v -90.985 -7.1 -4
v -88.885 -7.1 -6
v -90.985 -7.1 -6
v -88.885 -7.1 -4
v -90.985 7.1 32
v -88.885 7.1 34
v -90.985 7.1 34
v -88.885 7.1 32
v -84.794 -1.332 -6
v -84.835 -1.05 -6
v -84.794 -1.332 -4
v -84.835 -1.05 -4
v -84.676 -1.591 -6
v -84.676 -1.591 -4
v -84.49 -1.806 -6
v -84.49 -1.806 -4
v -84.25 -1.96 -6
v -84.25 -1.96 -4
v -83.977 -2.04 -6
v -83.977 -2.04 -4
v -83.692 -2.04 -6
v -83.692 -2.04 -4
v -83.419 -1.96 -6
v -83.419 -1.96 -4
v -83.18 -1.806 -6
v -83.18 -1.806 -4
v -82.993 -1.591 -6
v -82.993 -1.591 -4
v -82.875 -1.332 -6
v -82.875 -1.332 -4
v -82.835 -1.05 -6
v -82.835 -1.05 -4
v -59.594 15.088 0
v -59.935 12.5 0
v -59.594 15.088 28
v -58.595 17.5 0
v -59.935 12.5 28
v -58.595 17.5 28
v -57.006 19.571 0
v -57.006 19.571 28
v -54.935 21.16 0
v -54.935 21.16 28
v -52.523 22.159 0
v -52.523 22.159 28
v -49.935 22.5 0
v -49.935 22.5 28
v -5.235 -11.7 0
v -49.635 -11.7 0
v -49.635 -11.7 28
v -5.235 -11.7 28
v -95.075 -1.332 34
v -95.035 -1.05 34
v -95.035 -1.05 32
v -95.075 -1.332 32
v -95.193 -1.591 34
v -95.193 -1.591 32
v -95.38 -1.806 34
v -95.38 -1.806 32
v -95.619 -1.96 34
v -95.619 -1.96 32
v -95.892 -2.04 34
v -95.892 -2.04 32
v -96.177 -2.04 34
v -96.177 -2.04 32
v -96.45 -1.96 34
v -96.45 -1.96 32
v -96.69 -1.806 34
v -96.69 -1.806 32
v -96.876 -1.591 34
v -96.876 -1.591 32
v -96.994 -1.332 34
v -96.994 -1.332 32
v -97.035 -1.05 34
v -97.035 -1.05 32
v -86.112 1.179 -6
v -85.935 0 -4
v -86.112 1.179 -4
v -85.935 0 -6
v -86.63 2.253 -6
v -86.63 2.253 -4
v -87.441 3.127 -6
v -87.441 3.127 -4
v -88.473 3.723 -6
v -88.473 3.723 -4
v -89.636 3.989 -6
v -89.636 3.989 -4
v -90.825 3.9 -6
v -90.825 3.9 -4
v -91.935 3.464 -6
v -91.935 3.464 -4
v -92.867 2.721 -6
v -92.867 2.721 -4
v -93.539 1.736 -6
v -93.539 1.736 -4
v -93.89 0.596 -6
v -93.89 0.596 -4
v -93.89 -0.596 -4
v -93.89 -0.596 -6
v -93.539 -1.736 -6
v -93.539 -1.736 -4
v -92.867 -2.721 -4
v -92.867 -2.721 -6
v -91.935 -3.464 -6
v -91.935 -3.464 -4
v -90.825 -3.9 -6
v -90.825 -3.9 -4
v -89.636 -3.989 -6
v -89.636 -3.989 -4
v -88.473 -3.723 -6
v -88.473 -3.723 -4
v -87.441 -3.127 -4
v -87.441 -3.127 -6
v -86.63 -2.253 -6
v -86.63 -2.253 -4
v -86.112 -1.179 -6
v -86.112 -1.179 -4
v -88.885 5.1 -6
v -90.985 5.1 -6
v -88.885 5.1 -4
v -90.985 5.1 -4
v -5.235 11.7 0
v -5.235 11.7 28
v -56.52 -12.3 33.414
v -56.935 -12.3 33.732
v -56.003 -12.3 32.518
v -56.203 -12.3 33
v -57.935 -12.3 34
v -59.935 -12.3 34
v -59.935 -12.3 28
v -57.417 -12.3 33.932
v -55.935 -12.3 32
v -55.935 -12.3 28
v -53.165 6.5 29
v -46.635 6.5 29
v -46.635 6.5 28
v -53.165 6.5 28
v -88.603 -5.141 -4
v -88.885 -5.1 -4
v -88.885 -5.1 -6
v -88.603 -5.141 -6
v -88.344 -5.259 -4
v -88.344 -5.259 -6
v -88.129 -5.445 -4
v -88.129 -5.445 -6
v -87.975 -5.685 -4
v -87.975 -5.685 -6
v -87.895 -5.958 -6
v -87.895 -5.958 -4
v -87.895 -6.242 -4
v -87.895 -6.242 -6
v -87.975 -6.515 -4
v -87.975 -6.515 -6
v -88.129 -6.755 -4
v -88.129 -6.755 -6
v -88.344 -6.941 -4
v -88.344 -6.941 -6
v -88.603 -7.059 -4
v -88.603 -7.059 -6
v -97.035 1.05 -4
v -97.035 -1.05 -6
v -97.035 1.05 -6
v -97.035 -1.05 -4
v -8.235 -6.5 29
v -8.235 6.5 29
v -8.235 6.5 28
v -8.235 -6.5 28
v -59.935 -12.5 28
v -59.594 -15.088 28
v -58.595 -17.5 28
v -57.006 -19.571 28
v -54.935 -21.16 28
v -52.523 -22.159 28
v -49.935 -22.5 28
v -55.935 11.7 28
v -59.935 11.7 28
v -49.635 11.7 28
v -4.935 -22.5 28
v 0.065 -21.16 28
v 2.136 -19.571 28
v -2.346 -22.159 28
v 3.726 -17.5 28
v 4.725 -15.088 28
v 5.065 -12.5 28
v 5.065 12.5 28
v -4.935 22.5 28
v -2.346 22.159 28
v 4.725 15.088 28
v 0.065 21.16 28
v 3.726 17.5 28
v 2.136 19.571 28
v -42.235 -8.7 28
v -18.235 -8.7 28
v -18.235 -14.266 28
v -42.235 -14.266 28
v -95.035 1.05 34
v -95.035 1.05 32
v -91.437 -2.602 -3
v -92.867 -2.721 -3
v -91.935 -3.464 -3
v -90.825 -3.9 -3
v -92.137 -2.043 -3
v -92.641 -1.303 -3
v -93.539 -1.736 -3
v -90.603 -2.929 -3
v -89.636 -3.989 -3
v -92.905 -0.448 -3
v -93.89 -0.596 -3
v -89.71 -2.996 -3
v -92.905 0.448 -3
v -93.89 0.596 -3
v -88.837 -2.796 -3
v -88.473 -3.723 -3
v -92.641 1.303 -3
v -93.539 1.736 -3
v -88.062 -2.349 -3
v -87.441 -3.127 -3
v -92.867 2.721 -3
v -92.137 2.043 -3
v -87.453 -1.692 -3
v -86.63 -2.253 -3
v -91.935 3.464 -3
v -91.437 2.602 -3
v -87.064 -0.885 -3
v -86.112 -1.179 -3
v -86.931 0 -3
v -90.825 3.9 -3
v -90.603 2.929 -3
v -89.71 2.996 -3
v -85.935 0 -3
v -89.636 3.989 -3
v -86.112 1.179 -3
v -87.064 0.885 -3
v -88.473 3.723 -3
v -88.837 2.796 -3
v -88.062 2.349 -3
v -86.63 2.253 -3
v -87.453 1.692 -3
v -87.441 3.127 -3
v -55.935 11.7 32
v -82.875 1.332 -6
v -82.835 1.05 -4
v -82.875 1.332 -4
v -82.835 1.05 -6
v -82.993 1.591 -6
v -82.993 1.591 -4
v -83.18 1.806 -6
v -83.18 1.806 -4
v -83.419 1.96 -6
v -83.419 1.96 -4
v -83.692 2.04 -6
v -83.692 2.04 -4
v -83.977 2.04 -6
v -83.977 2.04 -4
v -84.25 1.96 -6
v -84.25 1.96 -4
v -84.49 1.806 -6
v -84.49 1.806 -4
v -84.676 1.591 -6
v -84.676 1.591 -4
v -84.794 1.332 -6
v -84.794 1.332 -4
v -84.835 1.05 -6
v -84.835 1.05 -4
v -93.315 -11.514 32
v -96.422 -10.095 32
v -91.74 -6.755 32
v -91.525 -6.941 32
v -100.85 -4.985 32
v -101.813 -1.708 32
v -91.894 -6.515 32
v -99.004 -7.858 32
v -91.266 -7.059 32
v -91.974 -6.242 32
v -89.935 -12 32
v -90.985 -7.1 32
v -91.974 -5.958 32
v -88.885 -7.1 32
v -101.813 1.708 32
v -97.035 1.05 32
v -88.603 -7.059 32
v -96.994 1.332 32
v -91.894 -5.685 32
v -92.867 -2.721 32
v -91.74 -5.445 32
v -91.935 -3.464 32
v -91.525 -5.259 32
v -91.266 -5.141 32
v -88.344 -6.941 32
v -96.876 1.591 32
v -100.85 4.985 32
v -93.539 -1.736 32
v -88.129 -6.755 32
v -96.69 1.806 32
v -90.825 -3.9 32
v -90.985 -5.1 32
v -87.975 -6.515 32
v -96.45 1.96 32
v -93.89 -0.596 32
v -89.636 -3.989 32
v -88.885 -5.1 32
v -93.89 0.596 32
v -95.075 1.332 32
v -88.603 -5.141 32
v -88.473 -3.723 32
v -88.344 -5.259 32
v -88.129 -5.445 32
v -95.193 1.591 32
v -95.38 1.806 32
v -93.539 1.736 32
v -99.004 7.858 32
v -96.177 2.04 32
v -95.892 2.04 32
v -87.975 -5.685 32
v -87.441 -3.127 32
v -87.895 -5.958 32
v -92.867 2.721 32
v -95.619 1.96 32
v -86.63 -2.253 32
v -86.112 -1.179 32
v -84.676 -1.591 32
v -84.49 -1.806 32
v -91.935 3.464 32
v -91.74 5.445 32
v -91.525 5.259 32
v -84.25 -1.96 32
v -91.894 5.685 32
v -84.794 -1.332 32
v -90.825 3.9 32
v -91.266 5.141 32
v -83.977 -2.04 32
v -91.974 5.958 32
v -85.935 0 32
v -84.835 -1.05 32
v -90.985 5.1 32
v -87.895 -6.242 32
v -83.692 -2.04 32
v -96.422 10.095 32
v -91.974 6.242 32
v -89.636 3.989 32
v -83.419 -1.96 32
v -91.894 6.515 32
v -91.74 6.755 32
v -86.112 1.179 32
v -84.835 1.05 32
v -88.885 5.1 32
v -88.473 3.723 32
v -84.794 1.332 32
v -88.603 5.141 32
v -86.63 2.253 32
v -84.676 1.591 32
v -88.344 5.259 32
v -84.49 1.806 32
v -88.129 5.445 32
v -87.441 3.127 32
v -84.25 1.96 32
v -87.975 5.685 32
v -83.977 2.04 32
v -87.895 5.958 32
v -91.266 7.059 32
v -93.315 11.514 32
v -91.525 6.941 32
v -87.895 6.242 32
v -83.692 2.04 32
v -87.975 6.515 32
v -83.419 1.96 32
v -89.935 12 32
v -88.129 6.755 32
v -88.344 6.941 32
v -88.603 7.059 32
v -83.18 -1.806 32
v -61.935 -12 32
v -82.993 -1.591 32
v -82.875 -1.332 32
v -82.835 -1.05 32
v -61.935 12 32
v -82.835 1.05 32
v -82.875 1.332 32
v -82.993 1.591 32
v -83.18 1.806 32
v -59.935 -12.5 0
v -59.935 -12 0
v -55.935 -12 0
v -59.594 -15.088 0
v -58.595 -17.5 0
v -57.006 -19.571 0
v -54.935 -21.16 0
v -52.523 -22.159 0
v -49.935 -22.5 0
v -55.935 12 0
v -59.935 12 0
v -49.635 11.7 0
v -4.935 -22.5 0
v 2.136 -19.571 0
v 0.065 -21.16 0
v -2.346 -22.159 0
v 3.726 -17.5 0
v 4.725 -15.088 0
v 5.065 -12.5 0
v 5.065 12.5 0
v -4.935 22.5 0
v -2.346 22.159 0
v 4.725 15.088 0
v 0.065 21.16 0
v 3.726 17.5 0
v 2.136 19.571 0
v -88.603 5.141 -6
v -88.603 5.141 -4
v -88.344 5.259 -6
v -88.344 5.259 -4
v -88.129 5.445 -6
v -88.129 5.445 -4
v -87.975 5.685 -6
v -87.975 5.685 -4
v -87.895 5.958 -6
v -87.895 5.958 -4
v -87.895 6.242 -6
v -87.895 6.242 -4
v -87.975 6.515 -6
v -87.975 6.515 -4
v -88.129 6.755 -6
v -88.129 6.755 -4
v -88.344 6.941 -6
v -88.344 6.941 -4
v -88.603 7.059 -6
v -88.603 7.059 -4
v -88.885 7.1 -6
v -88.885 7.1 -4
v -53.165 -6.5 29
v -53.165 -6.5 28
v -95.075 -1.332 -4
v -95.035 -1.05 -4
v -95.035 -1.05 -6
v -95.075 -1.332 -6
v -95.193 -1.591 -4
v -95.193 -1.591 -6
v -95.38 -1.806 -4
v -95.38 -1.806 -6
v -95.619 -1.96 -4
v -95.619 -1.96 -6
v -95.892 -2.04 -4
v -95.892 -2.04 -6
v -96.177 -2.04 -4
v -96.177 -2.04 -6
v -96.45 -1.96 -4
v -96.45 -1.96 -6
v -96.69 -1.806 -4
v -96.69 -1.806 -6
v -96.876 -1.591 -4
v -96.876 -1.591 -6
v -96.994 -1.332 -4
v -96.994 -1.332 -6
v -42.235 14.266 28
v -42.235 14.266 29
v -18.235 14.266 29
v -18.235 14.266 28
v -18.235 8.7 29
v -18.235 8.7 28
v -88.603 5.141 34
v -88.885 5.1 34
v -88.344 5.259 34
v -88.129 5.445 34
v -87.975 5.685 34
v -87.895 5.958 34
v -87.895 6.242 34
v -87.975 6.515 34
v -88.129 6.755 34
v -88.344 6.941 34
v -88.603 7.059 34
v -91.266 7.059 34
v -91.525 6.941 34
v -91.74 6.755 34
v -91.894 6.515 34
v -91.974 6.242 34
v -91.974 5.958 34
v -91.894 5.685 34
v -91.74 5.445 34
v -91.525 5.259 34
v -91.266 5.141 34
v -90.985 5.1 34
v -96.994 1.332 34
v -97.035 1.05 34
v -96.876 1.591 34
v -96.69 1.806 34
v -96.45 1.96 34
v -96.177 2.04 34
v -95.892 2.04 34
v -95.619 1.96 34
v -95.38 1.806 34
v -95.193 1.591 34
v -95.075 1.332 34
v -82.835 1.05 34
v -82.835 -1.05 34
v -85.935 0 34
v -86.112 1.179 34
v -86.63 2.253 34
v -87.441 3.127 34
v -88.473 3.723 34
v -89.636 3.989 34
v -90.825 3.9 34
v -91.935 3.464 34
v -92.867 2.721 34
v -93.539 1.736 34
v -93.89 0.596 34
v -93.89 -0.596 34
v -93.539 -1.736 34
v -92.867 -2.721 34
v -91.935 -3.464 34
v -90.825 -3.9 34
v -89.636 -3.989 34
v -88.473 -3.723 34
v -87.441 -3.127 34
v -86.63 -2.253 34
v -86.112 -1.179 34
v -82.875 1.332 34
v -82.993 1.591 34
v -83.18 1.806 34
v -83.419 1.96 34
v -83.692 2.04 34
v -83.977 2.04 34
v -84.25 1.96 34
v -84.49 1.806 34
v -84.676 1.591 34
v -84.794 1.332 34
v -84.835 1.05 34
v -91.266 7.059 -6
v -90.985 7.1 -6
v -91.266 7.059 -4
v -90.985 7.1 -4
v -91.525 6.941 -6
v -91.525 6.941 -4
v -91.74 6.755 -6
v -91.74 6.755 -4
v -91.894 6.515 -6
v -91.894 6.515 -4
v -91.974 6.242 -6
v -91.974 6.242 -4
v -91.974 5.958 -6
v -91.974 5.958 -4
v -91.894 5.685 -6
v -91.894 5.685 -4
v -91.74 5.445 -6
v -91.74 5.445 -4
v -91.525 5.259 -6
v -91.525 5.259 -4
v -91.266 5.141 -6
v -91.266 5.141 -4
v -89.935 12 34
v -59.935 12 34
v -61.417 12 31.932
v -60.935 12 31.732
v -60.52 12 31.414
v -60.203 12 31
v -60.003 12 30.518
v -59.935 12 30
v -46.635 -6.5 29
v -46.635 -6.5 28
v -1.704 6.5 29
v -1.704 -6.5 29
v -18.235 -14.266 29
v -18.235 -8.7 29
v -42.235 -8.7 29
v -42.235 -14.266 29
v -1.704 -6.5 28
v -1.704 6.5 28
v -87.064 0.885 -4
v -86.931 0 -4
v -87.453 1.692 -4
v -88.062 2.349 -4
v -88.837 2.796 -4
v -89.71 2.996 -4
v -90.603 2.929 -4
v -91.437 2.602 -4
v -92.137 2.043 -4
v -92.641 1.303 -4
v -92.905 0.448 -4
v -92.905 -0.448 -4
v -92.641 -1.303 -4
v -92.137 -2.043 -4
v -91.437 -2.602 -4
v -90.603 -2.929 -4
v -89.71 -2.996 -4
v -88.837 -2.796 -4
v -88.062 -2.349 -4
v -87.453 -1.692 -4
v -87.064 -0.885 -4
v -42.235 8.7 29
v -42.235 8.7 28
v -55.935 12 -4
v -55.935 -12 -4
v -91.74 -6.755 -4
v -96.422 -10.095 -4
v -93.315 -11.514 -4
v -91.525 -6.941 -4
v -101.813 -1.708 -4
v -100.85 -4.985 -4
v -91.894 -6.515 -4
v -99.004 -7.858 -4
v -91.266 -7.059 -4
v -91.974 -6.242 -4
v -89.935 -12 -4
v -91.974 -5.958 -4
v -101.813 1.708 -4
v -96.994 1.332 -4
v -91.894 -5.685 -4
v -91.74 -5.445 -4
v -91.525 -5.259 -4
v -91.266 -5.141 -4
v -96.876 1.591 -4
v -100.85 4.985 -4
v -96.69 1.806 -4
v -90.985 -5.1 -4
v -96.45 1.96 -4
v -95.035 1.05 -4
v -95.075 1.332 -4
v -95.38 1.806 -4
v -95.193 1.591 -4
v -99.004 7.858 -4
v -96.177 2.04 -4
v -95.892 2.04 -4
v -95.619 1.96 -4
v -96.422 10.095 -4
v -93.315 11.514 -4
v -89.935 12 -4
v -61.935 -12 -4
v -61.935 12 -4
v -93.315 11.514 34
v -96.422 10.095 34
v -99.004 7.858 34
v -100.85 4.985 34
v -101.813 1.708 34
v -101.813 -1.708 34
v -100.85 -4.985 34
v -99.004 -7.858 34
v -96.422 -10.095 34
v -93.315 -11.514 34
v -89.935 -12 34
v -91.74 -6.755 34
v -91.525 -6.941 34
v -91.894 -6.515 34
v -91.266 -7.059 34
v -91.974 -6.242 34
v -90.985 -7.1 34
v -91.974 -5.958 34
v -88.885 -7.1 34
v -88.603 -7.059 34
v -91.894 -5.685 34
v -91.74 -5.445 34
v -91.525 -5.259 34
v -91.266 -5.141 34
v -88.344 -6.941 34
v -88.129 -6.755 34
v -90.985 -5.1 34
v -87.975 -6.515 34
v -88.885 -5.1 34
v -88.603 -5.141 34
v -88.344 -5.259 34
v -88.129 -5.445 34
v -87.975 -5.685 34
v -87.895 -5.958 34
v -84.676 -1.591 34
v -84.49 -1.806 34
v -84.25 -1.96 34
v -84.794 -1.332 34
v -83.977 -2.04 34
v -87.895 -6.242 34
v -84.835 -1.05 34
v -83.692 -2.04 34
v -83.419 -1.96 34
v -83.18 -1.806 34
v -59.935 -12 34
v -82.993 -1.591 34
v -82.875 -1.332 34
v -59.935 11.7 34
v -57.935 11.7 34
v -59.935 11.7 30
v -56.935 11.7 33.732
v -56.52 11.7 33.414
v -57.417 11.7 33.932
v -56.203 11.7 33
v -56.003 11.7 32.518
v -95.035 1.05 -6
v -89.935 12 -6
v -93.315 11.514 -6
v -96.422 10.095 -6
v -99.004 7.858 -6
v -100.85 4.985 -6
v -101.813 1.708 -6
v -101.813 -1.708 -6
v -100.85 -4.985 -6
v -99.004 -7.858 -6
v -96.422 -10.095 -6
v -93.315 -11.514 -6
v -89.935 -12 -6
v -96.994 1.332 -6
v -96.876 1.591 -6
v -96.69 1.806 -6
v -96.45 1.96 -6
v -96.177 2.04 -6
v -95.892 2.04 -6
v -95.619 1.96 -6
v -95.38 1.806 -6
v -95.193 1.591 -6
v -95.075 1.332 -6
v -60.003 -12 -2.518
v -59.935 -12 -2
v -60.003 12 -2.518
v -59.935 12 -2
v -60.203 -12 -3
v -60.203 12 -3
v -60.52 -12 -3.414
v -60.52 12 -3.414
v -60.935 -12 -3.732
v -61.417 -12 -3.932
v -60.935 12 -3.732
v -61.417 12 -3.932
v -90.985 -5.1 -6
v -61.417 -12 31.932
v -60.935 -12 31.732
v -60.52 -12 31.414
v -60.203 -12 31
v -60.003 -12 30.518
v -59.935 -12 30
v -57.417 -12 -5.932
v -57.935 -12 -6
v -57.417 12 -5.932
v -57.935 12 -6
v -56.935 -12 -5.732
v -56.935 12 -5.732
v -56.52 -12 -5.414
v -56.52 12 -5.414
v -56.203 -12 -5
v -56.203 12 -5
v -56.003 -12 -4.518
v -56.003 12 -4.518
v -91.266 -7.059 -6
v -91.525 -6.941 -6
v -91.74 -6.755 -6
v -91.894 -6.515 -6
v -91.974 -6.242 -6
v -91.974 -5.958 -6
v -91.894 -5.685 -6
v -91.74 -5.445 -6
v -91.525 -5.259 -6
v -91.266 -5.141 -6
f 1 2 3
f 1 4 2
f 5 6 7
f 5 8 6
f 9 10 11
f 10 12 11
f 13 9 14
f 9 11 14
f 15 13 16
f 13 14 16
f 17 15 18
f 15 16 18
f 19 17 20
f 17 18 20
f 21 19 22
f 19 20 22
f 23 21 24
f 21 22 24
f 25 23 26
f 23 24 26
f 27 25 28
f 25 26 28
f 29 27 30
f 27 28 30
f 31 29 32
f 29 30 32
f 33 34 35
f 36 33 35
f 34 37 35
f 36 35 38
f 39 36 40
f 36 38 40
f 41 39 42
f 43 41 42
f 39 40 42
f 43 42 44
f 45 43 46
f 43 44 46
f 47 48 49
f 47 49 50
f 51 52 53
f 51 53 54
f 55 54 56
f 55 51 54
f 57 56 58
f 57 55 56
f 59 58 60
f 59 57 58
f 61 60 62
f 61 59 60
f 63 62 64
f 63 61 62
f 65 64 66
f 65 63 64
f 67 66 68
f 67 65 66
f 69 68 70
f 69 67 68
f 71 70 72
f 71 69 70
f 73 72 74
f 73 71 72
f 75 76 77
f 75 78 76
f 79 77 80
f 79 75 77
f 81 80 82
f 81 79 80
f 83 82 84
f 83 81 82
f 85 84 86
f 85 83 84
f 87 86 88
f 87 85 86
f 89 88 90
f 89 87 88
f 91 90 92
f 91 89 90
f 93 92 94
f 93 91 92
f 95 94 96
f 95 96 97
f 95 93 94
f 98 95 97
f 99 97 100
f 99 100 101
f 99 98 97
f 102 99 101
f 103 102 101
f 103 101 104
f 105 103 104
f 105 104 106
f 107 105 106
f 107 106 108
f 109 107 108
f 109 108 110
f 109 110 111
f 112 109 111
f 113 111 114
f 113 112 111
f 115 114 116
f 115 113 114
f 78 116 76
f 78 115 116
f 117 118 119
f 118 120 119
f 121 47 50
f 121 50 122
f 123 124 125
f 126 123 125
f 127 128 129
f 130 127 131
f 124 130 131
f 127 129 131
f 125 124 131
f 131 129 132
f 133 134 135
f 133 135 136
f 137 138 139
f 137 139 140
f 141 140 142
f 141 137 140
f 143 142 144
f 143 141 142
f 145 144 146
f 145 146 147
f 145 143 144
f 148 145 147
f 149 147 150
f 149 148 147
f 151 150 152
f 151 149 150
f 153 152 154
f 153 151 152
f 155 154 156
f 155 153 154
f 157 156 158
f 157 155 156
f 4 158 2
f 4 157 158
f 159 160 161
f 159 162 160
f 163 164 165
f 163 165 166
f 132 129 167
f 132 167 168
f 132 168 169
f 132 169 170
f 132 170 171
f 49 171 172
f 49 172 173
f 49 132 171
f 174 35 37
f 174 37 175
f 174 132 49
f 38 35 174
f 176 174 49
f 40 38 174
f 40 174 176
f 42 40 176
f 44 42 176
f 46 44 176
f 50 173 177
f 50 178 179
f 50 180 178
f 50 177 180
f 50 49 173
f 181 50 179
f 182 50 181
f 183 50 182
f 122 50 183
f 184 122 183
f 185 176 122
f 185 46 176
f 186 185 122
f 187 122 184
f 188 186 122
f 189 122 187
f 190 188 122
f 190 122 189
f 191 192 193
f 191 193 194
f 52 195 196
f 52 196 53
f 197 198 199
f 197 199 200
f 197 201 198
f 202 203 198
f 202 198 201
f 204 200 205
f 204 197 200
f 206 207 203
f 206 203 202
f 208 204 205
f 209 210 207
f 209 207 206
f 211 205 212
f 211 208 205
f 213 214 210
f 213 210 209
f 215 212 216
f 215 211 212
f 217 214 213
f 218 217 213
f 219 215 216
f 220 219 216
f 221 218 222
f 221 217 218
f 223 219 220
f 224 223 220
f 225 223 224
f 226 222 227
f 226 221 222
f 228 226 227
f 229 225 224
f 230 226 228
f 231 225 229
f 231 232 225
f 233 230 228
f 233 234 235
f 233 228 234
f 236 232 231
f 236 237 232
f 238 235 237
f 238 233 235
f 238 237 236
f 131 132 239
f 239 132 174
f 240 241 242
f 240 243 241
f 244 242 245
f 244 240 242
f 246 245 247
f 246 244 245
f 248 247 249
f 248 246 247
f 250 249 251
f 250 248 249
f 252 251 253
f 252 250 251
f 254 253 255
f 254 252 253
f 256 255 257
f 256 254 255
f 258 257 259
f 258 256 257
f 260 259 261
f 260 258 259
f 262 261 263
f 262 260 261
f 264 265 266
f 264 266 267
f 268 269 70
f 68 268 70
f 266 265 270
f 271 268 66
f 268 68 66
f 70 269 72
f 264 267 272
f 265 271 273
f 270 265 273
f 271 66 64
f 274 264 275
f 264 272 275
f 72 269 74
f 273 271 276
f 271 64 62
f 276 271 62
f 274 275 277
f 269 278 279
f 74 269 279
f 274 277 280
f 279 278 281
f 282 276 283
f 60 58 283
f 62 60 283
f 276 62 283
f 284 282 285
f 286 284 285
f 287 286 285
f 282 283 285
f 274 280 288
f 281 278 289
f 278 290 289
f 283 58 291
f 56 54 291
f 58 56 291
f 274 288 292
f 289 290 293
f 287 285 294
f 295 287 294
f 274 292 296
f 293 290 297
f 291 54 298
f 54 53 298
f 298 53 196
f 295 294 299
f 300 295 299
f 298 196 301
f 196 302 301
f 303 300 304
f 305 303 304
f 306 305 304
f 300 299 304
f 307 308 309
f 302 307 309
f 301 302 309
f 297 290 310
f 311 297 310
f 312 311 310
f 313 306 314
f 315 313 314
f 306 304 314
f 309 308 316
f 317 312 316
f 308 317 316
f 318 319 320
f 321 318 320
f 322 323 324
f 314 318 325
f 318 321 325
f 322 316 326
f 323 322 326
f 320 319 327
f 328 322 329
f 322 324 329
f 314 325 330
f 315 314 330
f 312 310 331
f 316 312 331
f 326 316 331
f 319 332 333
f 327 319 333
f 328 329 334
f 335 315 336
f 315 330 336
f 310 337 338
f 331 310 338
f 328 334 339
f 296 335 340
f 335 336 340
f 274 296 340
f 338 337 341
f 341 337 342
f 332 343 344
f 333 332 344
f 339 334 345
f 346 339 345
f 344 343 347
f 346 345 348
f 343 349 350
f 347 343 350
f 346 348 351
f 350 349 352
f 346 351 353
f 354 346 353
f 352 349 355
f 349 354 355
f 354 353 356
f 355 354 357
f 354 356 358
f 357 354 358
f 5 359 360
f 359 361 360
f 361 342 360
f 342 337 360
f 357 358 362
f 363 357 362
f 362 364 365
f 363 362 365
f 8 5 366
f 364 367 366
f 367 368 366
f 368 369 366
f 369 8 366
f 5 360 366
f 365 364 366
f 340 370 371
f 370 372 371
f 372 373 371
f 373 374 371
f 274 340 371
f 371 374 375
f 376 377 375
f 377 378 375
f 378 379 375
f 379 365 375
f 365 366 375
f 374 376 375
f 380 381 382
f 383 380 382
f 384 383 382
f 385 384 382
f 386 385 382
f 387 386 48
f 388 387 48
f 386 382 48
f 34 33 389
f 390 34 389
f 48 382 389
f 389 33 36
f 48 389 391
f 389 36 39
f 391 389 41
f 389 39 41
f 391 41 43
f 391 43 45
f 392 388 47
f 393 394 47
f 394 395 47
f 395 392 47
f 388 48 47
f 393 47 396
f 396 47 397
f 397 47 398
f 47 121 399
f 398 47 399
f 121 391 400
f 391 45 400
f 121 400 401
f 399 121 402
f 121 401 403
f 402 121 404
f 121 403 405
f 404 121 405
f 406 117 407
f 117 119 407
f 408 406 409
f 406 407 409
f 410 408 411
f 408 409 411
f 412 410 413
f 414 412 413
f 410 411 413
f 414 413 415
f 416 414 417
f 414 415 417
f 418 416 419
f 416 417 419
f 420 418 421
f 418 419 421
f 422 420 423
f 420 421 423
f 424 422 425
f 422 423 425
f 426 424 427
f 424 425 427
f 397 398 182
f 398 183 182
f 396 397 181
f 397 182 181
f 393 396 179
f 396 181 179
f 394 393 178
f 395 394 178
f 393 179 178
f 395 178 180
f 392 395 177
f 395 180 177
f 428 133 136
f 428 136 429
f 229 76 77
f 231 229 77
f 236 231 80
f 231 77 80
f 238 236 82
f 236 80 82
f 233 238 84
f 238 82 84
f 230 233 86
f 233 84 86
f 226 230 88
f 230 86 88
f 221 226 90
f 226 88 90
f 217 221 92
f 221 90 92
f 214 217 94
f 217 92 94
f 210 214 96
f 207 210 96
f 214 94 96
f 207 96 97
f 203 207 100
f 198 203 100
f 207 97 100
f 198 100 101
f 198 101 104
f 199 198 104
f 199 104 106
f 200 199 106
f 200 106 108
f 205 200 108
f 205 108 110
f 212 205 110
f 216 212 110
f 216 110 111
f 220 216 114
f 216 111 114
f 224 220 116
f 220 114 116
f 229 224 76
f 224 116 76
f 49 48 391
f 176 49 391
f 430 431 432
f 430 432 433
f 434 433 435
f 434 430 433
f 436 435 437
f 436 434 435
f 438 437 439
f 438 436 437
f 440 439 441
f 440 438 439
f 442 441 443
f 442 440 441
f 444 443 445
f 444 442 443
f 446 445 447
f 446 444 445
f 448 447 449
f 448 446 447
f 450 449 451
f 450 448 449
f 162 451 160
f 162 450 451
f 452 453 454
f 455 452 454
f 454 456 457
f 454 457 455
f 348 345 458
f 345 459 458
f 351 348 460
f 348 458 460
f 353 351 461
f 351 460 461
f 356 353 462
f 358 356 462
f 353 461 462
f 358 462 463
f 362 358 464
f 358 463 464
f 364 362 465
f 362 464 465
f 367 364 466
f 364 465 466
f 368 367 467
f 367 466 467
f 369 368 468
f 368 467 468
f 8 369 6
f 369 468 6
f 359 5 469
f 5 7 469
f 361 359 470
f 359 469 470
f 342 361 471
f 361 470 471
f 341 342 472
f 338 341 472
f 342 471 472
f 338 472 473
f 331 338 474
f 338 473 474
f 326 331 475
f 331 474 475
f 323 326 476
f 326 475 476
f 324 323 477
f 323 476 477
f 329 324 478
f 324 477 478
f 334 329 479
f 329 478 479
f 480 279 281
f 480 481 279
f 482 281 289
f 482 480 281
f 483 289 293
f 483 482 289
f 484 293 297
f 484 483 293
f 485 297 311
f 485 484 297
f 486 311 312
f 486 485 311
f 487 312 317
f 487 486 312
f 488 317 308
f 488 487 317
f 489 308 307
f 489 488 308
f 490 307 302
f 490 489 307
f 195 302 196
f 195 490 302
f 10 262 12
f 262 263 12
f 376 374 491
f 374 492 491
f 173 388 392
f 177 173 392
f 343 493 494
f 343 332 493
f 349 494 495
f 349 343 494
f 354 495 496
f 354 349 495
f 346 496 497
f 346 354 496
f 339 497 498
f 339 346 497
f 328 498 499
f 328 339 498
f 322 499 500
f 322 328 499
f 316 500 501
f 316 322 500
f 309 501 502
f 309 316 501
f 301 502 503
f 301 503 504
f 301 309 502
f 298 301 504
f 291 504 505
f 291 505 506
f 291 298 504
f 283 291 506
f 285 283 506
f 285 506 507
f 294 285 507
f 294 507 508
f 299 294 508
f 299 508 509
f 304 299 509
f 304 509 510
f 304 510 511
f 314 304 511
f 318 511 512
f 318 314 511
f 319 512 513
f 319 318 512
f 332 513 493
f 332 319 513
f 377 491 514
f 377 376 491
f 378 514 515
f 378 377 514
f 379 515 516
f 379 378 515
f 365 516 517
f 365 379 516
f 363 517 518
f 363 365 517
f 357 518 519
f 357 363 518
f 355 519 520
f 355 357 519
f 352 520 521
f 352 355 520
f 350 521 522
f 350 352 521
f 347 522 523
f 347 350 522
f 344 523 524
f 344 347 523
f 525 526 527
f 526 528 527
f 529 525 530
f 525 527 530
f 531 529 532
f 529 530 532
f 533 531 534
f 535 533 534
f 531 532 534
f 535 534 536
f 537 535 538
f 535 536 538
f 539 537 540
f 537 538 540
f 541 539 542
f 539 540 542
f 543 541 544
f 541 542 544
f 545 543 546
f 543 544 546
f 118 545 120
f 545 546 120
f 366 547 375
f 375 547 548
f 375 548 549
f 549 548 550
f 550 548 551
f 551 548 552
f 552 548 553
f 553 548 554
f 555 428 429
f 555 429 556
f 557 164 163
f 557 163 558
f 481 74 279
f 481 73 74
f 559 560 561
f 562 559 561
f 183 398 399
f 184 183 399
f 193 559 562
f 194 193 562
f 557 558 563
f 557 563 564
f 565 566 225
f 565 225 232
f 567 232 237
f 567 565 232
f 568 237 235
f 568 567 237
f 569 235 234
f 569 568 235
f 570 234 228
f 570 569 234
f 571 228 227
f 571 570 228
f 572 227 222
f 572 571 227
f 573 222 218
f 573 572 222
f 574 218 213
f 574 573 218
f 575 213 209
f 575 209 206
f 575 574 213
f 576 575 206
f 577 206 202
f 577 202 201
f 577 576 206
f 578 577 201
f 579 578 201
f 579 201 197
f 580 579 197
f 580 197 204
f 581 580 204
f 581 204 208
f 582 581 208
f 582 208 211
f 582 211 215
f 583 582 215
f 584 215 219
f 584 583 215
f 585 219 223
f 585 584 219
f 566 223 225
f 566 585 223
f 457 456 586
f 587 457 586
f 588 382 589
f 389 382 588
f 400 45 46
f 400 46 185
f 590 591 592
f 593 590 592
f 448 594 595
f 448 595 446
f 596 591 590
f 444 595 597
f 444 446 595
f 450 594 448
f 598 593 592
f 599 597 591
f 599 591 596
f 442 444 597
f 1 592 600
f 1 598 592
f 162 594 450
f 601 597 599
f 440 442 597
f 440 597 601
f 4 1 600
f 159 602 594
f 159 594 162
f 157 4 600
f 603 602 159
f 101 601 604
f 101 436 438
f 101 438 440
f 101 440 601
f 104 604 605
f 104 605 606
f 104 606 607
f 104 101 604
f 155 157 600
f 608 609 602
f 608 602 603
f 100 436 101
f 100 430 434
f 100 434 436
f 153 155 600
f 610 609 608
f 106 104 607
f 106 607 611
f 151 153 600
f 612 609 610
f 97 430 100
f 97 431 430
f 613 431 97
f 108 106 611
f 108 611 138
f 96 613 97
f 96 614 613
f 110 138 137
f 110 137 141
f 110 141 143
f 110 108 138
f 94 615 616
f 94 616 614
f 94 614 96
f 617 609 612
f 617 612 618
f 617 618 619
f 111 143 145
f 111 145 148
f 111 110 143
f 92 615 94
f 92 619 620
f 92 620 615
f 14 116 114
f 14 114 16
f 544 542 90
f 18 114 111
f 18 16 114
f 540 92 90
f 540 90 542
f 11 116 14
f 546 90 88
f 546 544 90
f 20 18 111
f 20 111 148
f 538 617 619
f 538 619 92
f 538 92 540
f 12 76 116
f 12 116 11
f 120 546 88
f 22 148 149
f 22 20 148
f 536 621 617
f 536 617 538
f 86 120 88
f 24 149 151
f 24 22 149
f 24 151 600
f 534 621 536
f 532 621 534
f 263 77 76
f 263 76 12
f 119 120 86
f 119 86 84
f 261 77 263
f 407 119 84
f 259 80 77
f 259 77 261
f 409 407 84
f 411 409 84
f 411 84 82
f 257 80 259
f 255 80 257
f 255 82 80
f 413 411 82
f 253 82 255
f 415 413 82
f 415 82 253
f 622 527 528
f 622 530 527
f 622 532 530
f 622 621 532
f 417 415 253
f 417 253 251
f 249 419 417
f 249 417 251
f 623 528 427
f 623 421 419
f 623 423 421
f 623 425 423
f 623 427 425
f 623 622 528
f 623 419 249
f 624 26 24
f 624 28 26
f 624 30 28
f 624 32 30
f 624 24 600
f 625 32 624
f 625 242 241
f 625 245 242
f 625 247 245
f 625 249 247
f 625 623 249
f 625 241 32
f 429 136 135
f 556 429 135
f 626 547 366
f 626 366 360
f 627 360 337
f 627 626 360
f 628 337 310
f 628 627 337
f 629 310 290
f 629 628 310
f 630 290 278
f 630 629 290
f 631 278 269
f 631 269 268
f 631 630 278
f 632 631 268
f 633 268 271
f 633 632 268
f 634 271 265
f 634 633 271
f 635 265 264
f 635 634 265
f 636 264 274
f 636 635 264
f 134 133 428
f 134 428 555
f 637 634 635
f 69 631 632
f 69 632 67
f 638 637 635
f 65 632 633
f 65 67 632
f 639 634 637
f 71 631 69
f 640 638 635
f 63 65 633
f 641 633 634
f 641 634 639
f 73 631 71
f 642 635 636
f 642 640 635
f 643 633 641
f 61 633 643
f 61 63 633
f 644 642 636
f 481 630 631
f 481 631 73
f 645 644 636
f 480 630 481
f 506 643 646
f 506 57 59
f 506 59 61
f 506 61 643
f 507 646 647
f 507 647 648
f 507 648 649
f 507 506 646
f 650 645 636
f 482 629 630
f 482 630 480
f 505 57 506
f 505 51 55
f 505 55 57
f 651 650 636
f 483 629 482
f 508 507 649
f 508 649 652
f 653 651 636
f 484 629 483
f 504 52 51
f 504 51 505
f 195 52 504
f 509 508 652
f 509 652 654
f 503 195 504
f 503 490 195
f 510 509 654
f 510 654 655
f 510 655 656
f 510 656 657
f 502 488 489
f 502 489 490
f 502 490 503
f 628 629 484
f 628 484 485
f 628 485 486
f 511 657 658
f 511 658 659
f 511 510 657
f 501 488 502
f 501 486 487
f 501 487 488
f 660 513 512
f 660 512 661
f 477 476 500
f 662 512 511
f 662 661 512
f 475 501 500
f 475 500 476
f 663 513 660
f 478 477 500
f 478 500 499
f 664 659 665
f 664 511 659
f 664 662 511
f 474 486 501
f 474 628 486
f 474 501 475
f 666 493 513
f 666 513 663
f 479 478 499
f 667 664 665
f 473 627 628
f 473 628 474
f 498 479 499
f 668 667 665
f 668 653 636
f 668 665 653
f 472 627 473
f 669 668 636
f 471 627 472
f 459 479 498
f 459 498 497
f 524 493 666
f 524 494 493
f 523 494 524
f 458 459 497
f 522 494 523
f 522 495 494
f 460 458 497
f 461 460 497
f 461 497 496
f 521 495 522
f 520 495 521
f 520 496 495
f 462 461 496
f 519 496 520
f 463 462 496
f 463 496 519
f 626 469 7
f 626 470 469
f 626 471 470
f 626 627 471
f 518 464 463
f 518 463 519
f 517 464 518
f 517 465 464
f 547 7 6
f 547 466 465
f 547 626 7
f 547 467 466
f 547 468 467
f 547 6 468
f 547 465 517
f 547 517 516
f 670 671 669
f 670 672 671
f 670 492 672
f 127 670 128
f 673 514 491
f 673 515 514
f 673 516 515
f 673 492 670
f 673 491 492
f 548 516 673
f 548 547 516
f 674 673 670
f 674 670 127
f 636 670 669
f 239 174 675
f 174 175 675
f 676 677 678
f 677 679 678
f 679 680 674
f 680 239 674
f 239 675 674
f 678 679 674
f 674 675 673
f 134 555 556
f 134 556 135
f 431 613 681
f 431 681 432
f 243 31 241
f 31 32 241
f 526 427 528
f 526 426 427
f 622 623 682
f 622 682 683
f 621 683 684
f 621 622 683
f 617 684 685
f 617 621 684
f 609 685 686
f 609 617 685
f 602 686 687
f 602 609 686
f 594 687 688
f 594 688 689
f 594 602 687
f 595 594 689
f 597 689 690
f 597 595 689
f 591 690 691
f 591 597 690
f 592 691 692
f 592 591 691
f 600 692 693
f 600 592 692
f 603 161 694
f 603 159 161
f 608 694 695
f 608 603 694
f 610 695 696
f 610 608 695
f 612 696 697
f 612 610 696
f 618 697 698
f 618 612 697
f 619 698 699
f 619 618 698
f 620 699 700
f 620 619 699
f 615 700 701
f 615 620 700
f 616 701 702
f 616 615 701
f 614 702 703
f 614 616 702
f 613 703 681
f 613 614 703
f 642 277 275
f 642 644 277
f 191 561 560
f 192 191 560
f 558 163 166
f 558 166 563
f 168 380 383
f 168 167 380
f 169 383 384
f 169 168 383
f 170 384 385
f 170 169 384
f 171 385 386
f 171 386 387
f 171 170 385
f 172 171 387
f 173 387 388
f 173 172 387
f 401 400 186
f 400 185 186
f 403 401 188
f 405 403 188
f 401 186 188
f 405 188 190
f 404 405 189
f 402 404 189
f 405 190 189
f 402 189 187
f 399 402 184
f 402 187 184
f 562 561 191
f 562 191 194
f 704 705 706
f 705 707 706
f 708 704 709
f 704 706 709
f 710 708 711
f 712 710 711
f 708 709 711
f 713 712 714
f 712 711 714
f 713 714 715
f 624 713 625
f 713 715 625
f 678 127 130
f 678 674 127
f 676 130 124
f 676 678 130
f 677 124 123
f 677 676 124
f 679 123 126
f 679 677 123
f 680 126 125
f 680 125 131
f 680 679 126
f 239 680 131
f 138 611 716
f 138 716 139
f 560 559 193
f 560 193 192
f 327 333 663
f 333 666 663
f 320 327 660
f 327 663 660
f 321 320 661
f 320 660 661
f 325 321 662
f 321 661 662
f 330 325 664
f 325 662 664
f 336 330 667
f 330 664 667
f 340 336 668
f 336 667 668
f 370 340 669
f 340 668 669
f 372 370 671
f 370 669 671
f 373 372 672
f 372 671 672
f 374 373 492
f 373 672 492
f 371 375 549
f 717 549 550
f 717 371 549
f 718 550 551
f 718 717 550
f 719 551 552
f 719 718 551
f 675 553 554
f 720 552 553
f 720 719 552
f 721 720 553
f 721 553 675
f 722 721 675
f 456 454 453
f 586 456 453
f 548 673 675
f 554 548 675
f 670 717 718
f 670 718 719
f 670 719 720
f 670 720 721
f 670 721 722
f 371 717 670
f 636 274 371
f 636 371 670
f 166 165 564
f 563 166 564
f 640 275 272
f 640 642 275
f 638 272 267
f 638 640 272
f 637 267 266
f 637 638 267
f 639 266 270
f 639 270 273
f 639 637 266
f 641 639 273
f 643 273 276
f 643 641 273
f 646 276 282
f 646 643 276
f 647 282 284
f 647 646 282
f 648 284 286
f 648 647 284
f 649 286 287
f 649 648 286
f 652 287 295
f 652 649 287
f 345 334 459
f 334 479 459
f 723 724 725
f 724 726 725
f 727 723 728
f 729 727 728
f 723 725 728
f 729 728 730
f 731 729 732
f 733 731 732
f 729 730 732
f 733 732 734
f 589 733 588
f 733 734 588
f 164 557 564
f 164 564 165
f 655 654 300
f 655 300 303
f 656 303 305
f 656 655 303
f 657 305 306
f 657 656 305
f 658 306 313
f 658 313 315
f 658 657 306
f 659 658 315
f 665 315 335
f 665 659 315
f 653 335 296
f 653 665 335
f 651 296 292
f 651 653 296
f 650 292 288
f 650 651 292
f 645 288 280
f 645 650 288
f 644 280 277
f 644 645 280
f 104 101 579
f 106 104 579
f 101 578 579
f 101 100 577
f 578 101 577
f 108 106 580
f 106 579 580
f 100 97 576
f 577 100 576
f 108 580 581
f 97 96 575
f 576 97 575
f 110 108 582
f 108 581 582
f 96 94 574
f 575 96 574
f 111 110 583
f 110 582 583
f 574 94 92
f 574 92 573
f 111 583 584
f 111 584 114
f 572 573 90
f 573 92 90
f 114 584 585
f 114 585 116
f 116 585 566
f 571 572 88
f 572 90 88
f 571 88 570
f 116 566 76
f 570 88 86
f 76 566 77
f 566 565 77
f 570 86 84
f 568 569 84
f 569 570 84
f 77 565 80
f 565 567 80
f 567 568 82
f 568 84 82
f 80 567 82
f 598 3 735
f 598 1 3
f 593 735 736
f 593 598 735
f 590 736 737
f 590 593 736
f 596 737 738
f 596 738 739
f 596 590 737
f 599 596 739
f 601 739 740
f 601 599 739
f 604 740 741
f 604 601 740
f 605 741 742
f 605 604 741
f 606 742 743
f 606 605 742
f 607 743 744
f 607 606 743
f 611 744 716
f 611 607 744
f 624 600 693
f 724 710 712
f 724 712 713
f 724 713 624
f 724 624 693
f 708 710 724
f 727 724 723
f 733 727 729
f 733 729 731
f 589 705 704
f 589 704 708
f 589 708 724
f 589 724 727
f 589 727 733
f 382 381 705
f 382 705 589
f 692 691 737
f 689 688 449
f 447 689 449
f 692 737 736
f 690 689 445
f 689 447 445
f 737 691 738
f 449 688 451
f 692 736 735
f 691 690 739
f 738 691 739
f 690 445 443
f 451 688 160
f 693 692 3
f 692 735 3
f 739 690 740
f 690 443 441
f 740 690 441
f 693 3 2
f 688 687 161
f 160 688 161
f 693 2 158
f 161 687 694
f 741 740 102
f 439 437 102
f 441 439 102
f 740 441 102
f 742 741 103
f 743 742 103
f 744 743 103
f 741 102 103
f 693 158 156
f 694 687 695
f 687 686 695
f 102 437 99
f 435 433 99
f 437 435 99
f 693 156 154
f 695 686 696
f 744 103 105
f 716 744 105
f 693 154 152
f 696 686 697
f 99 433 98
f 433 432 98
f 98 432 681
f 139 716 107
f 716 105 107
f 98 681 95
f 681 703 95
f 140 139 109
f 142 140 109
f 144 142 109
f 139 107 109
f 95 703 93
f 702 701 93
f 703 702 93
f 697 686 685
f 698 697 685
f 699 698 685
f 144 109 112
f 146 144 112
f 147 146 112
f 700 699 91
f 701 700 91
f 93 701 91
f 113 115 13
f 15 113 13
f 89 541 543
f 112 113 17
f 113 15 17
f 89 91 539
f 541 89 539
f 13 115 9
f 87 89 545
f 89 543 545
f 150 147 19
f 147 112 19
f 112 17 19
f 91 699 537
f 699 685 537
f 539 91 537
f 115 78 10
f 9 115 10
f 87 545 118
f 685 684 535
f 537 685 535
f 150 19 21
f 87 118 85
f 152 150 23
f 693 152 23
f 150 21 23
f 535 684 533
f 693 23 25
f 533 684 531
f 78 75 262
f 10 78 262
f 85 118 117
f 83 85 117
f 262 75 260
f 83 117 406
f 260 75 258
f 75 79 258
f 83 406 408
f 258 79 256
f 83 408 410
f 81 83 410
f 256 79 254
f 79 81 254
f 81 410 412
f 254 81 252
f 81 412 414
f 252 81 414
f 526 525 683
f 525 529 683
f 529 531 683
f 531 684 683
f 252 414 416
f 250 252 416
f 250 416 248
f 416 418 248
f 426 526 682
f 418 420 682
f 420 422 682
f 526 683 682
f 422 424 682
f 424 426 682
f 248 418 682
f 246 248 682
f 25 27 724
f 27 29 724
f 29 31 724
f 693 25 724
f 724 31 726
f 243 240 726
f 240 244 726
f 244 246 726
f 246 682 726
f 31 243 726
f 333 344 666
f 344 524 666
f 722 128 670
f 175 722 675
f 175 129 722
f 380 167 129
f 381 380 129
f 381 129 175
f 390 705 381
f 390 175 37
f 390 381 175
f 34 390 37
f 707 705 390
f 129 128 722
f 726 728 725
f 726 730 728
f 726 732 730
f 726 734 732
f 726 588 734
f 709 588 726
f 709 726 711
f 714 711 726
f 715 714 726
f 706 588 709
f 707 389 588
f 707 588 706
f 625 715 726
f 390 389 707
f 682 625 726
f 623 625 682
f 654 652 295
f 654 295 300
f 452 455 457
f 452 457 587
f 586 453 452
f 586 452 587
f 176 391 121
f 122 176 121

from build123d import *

# Parameters (mm, degrees)
SKETCH_1_W             = 65
SKETCH_1_H             = 45
EXTRUDE_1_DEPTH        = 28
SKETCH_2_W             = 44.4
SKETCH_2_H             = 23.4
CUT_EXTRUDE_1_DEPTH    = 39
SKETCH_3_W             = 4
SKETCH_3_H             = 24
EXTRUDE_2_DEPTH        = 6
SKETCH_7_R             = 4
EXTRUDE_3_DEPTH        = 1
SKETCH_8_W             = 4
SKETCH_8_H             = 24
EXTRUDE_4_DEPTH        = 6
FILLET_1_R             = 10
FILLET_2_R             = 10
FILLET_3_R             = 10
FILLET_4_R             = 10
PATTERN_LINEAR_2_COUNT = 2
PATTERN_LINEAR_2_PITCH = 38
FILLET_5_R             = 2
FILLET_6_R             = 2
FILLET_7_R             = 2
FILLET_8_R             = 2
SKETCH_9_R             = 4
SKETCH_9_R_2           = 3.004103595
EXTRUDE_5_DEPTH        = 1
EXTRUDE_6_DEPTH        = 1
EXTRUDE_6_2_DEPTH      = 1
EXTRUDE_6_3_DEPTH      = 1
EXTRUDE_6_4_DEPTH      = 1


with BuildPart() as part:
    # 草圖1 → 填料-伸長1 (new body)
    with BuildSketch(Plane.XY):
        with Locations((-27.434655272, 0)):
            Rectangle(SKETCH_1_W, SKETCH_1_H)
    extrude(amount=EXTRUDE_1_DEPTH)

    # 草圖2 → 除料-伸長1 (cut)
    with BuildSketch(Plane.XY):
        with Locations((-27.434655272, 0)):
            Rectangle(SKETCH_2_W, SKETCH_2_H)
    extrude(amount=CUT_EXTRUDE_1_DEPTH, mode=Mode.SUBTRACT)

    # 草圖3 → 填料-伸長2 (add)
    with BuildSketch(Plane.XY.offset(28)):
        with Locations((-57.934655272, -0.3)):
            Rectangle(SKETCH_3_W, SKETCH_3_H)
    extrude(amount=EXTRUDE_2_DEPTH)

    # 草圖7 → 填料-伸長3 (add, symmetric)
    with BuildSketch(Plane.XY.offset(33)):
        with BuildLine():
            Line((-59.934655272, 12), (-89.934655272, 12))
            ThreePointArc((-89.934655272, 12), (-101.934655272, 0), (-89.934655272, -12))
            Line((-89.934655272, -12), (-59.934655272, -12))
            Line((-59.934655272, -12), (-59.934655272, 12))
        make_face()
        with Locations((-89.934655272, 0)):
            Circle(SKETCH_7_R, mode=Mode.SUBTRACT)
        with BuildLine():
            Line((-95.034655272, 1.05), (-95.034655272, -1.05))
            ThreePointArc((-95.034655272, -1.05), (-96.034655272, -2.05), (-97.034655272, -1.05))
            Line((-97.034655272, -1.05), (-97.034655272, 1.05))
            ThreePointArc((-97.034655272, 1.05), (-96.034655272, 2.05), (-95.034655272, 1.05))
        make_face(mode=Mode.SUBTRACT)
        with BuildLine():
            Line((-90.984655272, -5.1), (-88.884655272, -5.1))
            ThreePointArc((-88.884655272, -5.1), (-87.884655272, -6.1), (-88.884655272, -7.1))
            Line((-88.884655272, -7.1), (-90.984655272, -7.1))
            ThreePointArc((-90.984655272, -7.1), (-91.984655272, -6.1), (-90.984655272, -5.1))
        make_face(mode=Mode.SUBTRACT)
        with BuildLine():
            Line((-90.984655272, 5.1), (-88.884655272, 5.1))
            ThreePointArc((-88.884655272, 5.1), (-87.884655272, 6.1), (-88.884655272, 7.1))
            Line((-88.884655272, 7.1), (-90.984655272, 7.1))
            ThreePointArc((-90.984655272, 7.1), (-91.984655272, 6.1), (-90.984655272, 5.1))
        make_face(mode=Mode.SUBTRACT)
        with BuildLine():
            Line((-84.834655272, 1.05), (-84.834655272, -1.05))
            ThreePointArc((-84.834655272, -1.05), (-83.834655272, -2.05), (-82.834655272, -1.05))
            Line((-82.834655272, -1.05), (-82.834655272, 1.05))
            ThreePointArc((-82.834655272, 1.05), (-83.834655272, 2.05), (-84.834655272, 1.05))
        make_face(mode=Mode.SUBTRACT)
    extrude_3 = extrude(amount=EXTRUDE_3_DEPTH, both=True)

    # 草圖8 → 填料-伸長4 (add)
    with BuildSketch(Plane(origin=(0, 0, 0), x_dir=(-1, 0, 0), z_dir=(0, 0, -1))):
        with Locations((57.934655272, 0)):
            Rectangle(SKETCH_8_W, SKETCH_8_H)
    extrude(amount=EXTRUDE_4_DEPTH)

    # 圓角1
    fillet_1_edges = [part.edges().sort_by_distance(p)[0] for p in [
        (-59.934655272, -22.5, 14),
    ]]
    fillet(fillet_1_edges, radius=FILLET_1_R)

    # 圓角2
    fillet_2_edges = [part.edges().sort_by_distance(p)[0] for p in [
        (-59.934655272, 22.5, 14),
    ]]
    fillet(fillet_2_edges, radius=FILLET_2_R)

    # 圓角3
    fillet_3_edges = [part.edges().sort_by_distance(p)[0] for p in [
        (5.065344728, 22.5, 14),
    ]]
    fillet(fillet_3_edges, radius=FILLET_3_R)

    # 圓角4
    fillet_4_edges = [part.edges().sort_by_distance(p)[0] for p in [
        (5.065344728, -22.5, 14),
    ]]
    fillet(fillet_4_edges, radius=FILLET_4_R)

    # 直線複製排列2: 填料-伸長3 ×2
    with Locations(*[(0, 0, -i * PATTERN_LINEAR_2_PITCH) for i in range(1, PATTERN_LINEAR_2_COUNT)]):
        add(extrude_3)

    # 圓角5
    fillet_5_edges = [part.edges().sort_by_distance(p)[0] for p in [
        (-55.934655272, 0, -6),
    ]]
    fillet(fillet_5_edges, radius=FILLET_5_R)

    # 圓角6
    fillet_6_edges = [part.edges().sort_by_distance(p)[0] for p in [
        (-59.934655272, 0, -4),
    ]]
    fillet(fillet_6_edges, radius=FILLET_6_R)

    # 圓角7
    # the kernel refuses this fillet: 2 mm, written as the material it adds along each edge
    with BuildSketch(Plane(origin=(-59.934655272, -12, 32), x_dir=(0, 0, -1), z_dir=(0, 1, 0))) as fillet_7_piece_1_section:
        with BuildLine():
            CenterArc((FILLET_7_R, FILLET_7_R), FILLET_7_R, 180, 90)
            Line((0, FILLET_7_R), (0, 0))
            Line((0, 0), (FILLET_7_R, 0))
        make_face()
    fillet_7_piece_1 = extrude(amount=23.7, mode=Mode.PRIVATE)
    fillet_7_piece_1 = split(fillet_7_piece_1, bisect_by=Plane(origin=(-59.934655272, -0.15, 31.593053741), z_dir=(-1, 0, 0)), keep=Keep.TOP, mode=Mode.PRIVATE)
    add(fillet_7_piece_1)
    with BuildSketch(Plane(origin=(-59.934655272, -12, 32), x_dir=(0, 0, -1), z_dir=(0, 1, 0))) as fillet_7_piece_2_section:
        with BuildLine():
            CenterArc((FILLET_7_R, FILLET_7_R), FILLET_7_R, 180, 90)
            Line((0, FILLET_7_R), (0, 0))
            Line((0, 0), (FILLET_7_R, 0))
        make_face()
    fillet_7_piece_2 = extrude(amount=28.7, mode=Mode.PRIVATE)
    fillet_7_piece_2 = split(fillet_7_piece_2, bisect_by=Plane(origin=(-60.428557372, 11.7, 31.593053741), z_dir=(0, 1, 0)), keep=Keep.TOP, mode=Mode.PRIVATE)
    fillet_7_piece_2 = split(fillet_7_piece_2, bisect_by=Plane(origin=(-59.934655272, 11.85, 31.593053741), z_dir=(-1, 0, 0)), keep=Keep.TOP, mode=Mode.PRIVATE)
    fillet_7_piece_2 = split(fillet_7_piece_2, bisect_by=Plane(origin=(-60.428557372, 12, 31.593053741), z_dir=(0, -1, 0)), keep=Keep.TOP, mode=Mode.PRIVATE)
    add(fillet_7_piece_2)

    # 圓角8
    fillet_8_edges = [part.edges().sort_by_distance(p)[0] for p in [
        (-55.934655272, -0.3, 34),
    ]]
    fillet(fillet_8_edges, radius=FILLET_8_R)


with BuildPart() as body_2:
    # 草圖9 → 填料-伸長5 (new body)
    with BuildSketch(Plane.XY.offset(-4)):
        with Locations((-89.934655272, 0)):
            Circle(SKETCH_9_R)
        with Locations((-89.934655272, 0)):
            Circle(SKETCH_9_R_2, mode=Mode.SUBTRACT)
    extrude(amount=EXTRUDE_5_DEPTH)


with BuildPart() as body_3:
    # 草圖10 → 填料-伸長6 (new body)
    with BuildSketch(Plane.XY.offset(29)):
        Polygon((-42.234655272, 11.7), (-42.234655272, 14.266291238), (-18.234655272, 14.266291238), (-18.234655272, 11.7), (-18.234655272, 8.7), (-42.234655272, 8.7), align=None)
    extrude(amount=-EXTRUDE_6_DEPTH)


with BuildPart() as body_4:
    # 草圖10 → Extrude 6 2 (new body)
    with BuildSketch(Plane.XY.offset(29)):
        Polygon((-49.634655272, 6.5), (-53.165057103, 6.5), (-53.165057103, -6.5), (-49.634655272, -6.5), (-46.634655272, -6.5), (-46.634655272, 6.5), align=None)
    extrude(amount=-EXTRUDE_6_2_DEPTH)


with BuildPart() as body_5:
    # 草圖10 → Extrude 6 3 (new body)
    with BuildSketch(Plane.XY.offset(29)):
        Polygon((-42.234655272, -11.7), (-42.234655272, -8.7), (-18.234655272, -8.7), (-18.234655272, -11.7), (-18.234655272, -14.266291238), (-42.234655272, -14.266291238), align=None)
    extrude(amount=-EXTRUDE_6_3_DEPTH)


with BuildPart() as body_6:
    # 草圖10 → Extrude 6 4 (new body)
    with BuildSketch(Plane.XY.offset(29)):
        Polygon((-5.234655272, 6.5), (-8.234655272, 6.5), (-8.234655272, -6.5), (-5.234655272, -6.5), (-1.70425344, -6.5), (-1.70425344, 6.5), align=None)
    extrude(amount=-EXTRUDE_6_4_DEPTH)


solid = Compound([part.part, body_2.part, body_3.part, body_4.part, body_5.part, body_6.part])
